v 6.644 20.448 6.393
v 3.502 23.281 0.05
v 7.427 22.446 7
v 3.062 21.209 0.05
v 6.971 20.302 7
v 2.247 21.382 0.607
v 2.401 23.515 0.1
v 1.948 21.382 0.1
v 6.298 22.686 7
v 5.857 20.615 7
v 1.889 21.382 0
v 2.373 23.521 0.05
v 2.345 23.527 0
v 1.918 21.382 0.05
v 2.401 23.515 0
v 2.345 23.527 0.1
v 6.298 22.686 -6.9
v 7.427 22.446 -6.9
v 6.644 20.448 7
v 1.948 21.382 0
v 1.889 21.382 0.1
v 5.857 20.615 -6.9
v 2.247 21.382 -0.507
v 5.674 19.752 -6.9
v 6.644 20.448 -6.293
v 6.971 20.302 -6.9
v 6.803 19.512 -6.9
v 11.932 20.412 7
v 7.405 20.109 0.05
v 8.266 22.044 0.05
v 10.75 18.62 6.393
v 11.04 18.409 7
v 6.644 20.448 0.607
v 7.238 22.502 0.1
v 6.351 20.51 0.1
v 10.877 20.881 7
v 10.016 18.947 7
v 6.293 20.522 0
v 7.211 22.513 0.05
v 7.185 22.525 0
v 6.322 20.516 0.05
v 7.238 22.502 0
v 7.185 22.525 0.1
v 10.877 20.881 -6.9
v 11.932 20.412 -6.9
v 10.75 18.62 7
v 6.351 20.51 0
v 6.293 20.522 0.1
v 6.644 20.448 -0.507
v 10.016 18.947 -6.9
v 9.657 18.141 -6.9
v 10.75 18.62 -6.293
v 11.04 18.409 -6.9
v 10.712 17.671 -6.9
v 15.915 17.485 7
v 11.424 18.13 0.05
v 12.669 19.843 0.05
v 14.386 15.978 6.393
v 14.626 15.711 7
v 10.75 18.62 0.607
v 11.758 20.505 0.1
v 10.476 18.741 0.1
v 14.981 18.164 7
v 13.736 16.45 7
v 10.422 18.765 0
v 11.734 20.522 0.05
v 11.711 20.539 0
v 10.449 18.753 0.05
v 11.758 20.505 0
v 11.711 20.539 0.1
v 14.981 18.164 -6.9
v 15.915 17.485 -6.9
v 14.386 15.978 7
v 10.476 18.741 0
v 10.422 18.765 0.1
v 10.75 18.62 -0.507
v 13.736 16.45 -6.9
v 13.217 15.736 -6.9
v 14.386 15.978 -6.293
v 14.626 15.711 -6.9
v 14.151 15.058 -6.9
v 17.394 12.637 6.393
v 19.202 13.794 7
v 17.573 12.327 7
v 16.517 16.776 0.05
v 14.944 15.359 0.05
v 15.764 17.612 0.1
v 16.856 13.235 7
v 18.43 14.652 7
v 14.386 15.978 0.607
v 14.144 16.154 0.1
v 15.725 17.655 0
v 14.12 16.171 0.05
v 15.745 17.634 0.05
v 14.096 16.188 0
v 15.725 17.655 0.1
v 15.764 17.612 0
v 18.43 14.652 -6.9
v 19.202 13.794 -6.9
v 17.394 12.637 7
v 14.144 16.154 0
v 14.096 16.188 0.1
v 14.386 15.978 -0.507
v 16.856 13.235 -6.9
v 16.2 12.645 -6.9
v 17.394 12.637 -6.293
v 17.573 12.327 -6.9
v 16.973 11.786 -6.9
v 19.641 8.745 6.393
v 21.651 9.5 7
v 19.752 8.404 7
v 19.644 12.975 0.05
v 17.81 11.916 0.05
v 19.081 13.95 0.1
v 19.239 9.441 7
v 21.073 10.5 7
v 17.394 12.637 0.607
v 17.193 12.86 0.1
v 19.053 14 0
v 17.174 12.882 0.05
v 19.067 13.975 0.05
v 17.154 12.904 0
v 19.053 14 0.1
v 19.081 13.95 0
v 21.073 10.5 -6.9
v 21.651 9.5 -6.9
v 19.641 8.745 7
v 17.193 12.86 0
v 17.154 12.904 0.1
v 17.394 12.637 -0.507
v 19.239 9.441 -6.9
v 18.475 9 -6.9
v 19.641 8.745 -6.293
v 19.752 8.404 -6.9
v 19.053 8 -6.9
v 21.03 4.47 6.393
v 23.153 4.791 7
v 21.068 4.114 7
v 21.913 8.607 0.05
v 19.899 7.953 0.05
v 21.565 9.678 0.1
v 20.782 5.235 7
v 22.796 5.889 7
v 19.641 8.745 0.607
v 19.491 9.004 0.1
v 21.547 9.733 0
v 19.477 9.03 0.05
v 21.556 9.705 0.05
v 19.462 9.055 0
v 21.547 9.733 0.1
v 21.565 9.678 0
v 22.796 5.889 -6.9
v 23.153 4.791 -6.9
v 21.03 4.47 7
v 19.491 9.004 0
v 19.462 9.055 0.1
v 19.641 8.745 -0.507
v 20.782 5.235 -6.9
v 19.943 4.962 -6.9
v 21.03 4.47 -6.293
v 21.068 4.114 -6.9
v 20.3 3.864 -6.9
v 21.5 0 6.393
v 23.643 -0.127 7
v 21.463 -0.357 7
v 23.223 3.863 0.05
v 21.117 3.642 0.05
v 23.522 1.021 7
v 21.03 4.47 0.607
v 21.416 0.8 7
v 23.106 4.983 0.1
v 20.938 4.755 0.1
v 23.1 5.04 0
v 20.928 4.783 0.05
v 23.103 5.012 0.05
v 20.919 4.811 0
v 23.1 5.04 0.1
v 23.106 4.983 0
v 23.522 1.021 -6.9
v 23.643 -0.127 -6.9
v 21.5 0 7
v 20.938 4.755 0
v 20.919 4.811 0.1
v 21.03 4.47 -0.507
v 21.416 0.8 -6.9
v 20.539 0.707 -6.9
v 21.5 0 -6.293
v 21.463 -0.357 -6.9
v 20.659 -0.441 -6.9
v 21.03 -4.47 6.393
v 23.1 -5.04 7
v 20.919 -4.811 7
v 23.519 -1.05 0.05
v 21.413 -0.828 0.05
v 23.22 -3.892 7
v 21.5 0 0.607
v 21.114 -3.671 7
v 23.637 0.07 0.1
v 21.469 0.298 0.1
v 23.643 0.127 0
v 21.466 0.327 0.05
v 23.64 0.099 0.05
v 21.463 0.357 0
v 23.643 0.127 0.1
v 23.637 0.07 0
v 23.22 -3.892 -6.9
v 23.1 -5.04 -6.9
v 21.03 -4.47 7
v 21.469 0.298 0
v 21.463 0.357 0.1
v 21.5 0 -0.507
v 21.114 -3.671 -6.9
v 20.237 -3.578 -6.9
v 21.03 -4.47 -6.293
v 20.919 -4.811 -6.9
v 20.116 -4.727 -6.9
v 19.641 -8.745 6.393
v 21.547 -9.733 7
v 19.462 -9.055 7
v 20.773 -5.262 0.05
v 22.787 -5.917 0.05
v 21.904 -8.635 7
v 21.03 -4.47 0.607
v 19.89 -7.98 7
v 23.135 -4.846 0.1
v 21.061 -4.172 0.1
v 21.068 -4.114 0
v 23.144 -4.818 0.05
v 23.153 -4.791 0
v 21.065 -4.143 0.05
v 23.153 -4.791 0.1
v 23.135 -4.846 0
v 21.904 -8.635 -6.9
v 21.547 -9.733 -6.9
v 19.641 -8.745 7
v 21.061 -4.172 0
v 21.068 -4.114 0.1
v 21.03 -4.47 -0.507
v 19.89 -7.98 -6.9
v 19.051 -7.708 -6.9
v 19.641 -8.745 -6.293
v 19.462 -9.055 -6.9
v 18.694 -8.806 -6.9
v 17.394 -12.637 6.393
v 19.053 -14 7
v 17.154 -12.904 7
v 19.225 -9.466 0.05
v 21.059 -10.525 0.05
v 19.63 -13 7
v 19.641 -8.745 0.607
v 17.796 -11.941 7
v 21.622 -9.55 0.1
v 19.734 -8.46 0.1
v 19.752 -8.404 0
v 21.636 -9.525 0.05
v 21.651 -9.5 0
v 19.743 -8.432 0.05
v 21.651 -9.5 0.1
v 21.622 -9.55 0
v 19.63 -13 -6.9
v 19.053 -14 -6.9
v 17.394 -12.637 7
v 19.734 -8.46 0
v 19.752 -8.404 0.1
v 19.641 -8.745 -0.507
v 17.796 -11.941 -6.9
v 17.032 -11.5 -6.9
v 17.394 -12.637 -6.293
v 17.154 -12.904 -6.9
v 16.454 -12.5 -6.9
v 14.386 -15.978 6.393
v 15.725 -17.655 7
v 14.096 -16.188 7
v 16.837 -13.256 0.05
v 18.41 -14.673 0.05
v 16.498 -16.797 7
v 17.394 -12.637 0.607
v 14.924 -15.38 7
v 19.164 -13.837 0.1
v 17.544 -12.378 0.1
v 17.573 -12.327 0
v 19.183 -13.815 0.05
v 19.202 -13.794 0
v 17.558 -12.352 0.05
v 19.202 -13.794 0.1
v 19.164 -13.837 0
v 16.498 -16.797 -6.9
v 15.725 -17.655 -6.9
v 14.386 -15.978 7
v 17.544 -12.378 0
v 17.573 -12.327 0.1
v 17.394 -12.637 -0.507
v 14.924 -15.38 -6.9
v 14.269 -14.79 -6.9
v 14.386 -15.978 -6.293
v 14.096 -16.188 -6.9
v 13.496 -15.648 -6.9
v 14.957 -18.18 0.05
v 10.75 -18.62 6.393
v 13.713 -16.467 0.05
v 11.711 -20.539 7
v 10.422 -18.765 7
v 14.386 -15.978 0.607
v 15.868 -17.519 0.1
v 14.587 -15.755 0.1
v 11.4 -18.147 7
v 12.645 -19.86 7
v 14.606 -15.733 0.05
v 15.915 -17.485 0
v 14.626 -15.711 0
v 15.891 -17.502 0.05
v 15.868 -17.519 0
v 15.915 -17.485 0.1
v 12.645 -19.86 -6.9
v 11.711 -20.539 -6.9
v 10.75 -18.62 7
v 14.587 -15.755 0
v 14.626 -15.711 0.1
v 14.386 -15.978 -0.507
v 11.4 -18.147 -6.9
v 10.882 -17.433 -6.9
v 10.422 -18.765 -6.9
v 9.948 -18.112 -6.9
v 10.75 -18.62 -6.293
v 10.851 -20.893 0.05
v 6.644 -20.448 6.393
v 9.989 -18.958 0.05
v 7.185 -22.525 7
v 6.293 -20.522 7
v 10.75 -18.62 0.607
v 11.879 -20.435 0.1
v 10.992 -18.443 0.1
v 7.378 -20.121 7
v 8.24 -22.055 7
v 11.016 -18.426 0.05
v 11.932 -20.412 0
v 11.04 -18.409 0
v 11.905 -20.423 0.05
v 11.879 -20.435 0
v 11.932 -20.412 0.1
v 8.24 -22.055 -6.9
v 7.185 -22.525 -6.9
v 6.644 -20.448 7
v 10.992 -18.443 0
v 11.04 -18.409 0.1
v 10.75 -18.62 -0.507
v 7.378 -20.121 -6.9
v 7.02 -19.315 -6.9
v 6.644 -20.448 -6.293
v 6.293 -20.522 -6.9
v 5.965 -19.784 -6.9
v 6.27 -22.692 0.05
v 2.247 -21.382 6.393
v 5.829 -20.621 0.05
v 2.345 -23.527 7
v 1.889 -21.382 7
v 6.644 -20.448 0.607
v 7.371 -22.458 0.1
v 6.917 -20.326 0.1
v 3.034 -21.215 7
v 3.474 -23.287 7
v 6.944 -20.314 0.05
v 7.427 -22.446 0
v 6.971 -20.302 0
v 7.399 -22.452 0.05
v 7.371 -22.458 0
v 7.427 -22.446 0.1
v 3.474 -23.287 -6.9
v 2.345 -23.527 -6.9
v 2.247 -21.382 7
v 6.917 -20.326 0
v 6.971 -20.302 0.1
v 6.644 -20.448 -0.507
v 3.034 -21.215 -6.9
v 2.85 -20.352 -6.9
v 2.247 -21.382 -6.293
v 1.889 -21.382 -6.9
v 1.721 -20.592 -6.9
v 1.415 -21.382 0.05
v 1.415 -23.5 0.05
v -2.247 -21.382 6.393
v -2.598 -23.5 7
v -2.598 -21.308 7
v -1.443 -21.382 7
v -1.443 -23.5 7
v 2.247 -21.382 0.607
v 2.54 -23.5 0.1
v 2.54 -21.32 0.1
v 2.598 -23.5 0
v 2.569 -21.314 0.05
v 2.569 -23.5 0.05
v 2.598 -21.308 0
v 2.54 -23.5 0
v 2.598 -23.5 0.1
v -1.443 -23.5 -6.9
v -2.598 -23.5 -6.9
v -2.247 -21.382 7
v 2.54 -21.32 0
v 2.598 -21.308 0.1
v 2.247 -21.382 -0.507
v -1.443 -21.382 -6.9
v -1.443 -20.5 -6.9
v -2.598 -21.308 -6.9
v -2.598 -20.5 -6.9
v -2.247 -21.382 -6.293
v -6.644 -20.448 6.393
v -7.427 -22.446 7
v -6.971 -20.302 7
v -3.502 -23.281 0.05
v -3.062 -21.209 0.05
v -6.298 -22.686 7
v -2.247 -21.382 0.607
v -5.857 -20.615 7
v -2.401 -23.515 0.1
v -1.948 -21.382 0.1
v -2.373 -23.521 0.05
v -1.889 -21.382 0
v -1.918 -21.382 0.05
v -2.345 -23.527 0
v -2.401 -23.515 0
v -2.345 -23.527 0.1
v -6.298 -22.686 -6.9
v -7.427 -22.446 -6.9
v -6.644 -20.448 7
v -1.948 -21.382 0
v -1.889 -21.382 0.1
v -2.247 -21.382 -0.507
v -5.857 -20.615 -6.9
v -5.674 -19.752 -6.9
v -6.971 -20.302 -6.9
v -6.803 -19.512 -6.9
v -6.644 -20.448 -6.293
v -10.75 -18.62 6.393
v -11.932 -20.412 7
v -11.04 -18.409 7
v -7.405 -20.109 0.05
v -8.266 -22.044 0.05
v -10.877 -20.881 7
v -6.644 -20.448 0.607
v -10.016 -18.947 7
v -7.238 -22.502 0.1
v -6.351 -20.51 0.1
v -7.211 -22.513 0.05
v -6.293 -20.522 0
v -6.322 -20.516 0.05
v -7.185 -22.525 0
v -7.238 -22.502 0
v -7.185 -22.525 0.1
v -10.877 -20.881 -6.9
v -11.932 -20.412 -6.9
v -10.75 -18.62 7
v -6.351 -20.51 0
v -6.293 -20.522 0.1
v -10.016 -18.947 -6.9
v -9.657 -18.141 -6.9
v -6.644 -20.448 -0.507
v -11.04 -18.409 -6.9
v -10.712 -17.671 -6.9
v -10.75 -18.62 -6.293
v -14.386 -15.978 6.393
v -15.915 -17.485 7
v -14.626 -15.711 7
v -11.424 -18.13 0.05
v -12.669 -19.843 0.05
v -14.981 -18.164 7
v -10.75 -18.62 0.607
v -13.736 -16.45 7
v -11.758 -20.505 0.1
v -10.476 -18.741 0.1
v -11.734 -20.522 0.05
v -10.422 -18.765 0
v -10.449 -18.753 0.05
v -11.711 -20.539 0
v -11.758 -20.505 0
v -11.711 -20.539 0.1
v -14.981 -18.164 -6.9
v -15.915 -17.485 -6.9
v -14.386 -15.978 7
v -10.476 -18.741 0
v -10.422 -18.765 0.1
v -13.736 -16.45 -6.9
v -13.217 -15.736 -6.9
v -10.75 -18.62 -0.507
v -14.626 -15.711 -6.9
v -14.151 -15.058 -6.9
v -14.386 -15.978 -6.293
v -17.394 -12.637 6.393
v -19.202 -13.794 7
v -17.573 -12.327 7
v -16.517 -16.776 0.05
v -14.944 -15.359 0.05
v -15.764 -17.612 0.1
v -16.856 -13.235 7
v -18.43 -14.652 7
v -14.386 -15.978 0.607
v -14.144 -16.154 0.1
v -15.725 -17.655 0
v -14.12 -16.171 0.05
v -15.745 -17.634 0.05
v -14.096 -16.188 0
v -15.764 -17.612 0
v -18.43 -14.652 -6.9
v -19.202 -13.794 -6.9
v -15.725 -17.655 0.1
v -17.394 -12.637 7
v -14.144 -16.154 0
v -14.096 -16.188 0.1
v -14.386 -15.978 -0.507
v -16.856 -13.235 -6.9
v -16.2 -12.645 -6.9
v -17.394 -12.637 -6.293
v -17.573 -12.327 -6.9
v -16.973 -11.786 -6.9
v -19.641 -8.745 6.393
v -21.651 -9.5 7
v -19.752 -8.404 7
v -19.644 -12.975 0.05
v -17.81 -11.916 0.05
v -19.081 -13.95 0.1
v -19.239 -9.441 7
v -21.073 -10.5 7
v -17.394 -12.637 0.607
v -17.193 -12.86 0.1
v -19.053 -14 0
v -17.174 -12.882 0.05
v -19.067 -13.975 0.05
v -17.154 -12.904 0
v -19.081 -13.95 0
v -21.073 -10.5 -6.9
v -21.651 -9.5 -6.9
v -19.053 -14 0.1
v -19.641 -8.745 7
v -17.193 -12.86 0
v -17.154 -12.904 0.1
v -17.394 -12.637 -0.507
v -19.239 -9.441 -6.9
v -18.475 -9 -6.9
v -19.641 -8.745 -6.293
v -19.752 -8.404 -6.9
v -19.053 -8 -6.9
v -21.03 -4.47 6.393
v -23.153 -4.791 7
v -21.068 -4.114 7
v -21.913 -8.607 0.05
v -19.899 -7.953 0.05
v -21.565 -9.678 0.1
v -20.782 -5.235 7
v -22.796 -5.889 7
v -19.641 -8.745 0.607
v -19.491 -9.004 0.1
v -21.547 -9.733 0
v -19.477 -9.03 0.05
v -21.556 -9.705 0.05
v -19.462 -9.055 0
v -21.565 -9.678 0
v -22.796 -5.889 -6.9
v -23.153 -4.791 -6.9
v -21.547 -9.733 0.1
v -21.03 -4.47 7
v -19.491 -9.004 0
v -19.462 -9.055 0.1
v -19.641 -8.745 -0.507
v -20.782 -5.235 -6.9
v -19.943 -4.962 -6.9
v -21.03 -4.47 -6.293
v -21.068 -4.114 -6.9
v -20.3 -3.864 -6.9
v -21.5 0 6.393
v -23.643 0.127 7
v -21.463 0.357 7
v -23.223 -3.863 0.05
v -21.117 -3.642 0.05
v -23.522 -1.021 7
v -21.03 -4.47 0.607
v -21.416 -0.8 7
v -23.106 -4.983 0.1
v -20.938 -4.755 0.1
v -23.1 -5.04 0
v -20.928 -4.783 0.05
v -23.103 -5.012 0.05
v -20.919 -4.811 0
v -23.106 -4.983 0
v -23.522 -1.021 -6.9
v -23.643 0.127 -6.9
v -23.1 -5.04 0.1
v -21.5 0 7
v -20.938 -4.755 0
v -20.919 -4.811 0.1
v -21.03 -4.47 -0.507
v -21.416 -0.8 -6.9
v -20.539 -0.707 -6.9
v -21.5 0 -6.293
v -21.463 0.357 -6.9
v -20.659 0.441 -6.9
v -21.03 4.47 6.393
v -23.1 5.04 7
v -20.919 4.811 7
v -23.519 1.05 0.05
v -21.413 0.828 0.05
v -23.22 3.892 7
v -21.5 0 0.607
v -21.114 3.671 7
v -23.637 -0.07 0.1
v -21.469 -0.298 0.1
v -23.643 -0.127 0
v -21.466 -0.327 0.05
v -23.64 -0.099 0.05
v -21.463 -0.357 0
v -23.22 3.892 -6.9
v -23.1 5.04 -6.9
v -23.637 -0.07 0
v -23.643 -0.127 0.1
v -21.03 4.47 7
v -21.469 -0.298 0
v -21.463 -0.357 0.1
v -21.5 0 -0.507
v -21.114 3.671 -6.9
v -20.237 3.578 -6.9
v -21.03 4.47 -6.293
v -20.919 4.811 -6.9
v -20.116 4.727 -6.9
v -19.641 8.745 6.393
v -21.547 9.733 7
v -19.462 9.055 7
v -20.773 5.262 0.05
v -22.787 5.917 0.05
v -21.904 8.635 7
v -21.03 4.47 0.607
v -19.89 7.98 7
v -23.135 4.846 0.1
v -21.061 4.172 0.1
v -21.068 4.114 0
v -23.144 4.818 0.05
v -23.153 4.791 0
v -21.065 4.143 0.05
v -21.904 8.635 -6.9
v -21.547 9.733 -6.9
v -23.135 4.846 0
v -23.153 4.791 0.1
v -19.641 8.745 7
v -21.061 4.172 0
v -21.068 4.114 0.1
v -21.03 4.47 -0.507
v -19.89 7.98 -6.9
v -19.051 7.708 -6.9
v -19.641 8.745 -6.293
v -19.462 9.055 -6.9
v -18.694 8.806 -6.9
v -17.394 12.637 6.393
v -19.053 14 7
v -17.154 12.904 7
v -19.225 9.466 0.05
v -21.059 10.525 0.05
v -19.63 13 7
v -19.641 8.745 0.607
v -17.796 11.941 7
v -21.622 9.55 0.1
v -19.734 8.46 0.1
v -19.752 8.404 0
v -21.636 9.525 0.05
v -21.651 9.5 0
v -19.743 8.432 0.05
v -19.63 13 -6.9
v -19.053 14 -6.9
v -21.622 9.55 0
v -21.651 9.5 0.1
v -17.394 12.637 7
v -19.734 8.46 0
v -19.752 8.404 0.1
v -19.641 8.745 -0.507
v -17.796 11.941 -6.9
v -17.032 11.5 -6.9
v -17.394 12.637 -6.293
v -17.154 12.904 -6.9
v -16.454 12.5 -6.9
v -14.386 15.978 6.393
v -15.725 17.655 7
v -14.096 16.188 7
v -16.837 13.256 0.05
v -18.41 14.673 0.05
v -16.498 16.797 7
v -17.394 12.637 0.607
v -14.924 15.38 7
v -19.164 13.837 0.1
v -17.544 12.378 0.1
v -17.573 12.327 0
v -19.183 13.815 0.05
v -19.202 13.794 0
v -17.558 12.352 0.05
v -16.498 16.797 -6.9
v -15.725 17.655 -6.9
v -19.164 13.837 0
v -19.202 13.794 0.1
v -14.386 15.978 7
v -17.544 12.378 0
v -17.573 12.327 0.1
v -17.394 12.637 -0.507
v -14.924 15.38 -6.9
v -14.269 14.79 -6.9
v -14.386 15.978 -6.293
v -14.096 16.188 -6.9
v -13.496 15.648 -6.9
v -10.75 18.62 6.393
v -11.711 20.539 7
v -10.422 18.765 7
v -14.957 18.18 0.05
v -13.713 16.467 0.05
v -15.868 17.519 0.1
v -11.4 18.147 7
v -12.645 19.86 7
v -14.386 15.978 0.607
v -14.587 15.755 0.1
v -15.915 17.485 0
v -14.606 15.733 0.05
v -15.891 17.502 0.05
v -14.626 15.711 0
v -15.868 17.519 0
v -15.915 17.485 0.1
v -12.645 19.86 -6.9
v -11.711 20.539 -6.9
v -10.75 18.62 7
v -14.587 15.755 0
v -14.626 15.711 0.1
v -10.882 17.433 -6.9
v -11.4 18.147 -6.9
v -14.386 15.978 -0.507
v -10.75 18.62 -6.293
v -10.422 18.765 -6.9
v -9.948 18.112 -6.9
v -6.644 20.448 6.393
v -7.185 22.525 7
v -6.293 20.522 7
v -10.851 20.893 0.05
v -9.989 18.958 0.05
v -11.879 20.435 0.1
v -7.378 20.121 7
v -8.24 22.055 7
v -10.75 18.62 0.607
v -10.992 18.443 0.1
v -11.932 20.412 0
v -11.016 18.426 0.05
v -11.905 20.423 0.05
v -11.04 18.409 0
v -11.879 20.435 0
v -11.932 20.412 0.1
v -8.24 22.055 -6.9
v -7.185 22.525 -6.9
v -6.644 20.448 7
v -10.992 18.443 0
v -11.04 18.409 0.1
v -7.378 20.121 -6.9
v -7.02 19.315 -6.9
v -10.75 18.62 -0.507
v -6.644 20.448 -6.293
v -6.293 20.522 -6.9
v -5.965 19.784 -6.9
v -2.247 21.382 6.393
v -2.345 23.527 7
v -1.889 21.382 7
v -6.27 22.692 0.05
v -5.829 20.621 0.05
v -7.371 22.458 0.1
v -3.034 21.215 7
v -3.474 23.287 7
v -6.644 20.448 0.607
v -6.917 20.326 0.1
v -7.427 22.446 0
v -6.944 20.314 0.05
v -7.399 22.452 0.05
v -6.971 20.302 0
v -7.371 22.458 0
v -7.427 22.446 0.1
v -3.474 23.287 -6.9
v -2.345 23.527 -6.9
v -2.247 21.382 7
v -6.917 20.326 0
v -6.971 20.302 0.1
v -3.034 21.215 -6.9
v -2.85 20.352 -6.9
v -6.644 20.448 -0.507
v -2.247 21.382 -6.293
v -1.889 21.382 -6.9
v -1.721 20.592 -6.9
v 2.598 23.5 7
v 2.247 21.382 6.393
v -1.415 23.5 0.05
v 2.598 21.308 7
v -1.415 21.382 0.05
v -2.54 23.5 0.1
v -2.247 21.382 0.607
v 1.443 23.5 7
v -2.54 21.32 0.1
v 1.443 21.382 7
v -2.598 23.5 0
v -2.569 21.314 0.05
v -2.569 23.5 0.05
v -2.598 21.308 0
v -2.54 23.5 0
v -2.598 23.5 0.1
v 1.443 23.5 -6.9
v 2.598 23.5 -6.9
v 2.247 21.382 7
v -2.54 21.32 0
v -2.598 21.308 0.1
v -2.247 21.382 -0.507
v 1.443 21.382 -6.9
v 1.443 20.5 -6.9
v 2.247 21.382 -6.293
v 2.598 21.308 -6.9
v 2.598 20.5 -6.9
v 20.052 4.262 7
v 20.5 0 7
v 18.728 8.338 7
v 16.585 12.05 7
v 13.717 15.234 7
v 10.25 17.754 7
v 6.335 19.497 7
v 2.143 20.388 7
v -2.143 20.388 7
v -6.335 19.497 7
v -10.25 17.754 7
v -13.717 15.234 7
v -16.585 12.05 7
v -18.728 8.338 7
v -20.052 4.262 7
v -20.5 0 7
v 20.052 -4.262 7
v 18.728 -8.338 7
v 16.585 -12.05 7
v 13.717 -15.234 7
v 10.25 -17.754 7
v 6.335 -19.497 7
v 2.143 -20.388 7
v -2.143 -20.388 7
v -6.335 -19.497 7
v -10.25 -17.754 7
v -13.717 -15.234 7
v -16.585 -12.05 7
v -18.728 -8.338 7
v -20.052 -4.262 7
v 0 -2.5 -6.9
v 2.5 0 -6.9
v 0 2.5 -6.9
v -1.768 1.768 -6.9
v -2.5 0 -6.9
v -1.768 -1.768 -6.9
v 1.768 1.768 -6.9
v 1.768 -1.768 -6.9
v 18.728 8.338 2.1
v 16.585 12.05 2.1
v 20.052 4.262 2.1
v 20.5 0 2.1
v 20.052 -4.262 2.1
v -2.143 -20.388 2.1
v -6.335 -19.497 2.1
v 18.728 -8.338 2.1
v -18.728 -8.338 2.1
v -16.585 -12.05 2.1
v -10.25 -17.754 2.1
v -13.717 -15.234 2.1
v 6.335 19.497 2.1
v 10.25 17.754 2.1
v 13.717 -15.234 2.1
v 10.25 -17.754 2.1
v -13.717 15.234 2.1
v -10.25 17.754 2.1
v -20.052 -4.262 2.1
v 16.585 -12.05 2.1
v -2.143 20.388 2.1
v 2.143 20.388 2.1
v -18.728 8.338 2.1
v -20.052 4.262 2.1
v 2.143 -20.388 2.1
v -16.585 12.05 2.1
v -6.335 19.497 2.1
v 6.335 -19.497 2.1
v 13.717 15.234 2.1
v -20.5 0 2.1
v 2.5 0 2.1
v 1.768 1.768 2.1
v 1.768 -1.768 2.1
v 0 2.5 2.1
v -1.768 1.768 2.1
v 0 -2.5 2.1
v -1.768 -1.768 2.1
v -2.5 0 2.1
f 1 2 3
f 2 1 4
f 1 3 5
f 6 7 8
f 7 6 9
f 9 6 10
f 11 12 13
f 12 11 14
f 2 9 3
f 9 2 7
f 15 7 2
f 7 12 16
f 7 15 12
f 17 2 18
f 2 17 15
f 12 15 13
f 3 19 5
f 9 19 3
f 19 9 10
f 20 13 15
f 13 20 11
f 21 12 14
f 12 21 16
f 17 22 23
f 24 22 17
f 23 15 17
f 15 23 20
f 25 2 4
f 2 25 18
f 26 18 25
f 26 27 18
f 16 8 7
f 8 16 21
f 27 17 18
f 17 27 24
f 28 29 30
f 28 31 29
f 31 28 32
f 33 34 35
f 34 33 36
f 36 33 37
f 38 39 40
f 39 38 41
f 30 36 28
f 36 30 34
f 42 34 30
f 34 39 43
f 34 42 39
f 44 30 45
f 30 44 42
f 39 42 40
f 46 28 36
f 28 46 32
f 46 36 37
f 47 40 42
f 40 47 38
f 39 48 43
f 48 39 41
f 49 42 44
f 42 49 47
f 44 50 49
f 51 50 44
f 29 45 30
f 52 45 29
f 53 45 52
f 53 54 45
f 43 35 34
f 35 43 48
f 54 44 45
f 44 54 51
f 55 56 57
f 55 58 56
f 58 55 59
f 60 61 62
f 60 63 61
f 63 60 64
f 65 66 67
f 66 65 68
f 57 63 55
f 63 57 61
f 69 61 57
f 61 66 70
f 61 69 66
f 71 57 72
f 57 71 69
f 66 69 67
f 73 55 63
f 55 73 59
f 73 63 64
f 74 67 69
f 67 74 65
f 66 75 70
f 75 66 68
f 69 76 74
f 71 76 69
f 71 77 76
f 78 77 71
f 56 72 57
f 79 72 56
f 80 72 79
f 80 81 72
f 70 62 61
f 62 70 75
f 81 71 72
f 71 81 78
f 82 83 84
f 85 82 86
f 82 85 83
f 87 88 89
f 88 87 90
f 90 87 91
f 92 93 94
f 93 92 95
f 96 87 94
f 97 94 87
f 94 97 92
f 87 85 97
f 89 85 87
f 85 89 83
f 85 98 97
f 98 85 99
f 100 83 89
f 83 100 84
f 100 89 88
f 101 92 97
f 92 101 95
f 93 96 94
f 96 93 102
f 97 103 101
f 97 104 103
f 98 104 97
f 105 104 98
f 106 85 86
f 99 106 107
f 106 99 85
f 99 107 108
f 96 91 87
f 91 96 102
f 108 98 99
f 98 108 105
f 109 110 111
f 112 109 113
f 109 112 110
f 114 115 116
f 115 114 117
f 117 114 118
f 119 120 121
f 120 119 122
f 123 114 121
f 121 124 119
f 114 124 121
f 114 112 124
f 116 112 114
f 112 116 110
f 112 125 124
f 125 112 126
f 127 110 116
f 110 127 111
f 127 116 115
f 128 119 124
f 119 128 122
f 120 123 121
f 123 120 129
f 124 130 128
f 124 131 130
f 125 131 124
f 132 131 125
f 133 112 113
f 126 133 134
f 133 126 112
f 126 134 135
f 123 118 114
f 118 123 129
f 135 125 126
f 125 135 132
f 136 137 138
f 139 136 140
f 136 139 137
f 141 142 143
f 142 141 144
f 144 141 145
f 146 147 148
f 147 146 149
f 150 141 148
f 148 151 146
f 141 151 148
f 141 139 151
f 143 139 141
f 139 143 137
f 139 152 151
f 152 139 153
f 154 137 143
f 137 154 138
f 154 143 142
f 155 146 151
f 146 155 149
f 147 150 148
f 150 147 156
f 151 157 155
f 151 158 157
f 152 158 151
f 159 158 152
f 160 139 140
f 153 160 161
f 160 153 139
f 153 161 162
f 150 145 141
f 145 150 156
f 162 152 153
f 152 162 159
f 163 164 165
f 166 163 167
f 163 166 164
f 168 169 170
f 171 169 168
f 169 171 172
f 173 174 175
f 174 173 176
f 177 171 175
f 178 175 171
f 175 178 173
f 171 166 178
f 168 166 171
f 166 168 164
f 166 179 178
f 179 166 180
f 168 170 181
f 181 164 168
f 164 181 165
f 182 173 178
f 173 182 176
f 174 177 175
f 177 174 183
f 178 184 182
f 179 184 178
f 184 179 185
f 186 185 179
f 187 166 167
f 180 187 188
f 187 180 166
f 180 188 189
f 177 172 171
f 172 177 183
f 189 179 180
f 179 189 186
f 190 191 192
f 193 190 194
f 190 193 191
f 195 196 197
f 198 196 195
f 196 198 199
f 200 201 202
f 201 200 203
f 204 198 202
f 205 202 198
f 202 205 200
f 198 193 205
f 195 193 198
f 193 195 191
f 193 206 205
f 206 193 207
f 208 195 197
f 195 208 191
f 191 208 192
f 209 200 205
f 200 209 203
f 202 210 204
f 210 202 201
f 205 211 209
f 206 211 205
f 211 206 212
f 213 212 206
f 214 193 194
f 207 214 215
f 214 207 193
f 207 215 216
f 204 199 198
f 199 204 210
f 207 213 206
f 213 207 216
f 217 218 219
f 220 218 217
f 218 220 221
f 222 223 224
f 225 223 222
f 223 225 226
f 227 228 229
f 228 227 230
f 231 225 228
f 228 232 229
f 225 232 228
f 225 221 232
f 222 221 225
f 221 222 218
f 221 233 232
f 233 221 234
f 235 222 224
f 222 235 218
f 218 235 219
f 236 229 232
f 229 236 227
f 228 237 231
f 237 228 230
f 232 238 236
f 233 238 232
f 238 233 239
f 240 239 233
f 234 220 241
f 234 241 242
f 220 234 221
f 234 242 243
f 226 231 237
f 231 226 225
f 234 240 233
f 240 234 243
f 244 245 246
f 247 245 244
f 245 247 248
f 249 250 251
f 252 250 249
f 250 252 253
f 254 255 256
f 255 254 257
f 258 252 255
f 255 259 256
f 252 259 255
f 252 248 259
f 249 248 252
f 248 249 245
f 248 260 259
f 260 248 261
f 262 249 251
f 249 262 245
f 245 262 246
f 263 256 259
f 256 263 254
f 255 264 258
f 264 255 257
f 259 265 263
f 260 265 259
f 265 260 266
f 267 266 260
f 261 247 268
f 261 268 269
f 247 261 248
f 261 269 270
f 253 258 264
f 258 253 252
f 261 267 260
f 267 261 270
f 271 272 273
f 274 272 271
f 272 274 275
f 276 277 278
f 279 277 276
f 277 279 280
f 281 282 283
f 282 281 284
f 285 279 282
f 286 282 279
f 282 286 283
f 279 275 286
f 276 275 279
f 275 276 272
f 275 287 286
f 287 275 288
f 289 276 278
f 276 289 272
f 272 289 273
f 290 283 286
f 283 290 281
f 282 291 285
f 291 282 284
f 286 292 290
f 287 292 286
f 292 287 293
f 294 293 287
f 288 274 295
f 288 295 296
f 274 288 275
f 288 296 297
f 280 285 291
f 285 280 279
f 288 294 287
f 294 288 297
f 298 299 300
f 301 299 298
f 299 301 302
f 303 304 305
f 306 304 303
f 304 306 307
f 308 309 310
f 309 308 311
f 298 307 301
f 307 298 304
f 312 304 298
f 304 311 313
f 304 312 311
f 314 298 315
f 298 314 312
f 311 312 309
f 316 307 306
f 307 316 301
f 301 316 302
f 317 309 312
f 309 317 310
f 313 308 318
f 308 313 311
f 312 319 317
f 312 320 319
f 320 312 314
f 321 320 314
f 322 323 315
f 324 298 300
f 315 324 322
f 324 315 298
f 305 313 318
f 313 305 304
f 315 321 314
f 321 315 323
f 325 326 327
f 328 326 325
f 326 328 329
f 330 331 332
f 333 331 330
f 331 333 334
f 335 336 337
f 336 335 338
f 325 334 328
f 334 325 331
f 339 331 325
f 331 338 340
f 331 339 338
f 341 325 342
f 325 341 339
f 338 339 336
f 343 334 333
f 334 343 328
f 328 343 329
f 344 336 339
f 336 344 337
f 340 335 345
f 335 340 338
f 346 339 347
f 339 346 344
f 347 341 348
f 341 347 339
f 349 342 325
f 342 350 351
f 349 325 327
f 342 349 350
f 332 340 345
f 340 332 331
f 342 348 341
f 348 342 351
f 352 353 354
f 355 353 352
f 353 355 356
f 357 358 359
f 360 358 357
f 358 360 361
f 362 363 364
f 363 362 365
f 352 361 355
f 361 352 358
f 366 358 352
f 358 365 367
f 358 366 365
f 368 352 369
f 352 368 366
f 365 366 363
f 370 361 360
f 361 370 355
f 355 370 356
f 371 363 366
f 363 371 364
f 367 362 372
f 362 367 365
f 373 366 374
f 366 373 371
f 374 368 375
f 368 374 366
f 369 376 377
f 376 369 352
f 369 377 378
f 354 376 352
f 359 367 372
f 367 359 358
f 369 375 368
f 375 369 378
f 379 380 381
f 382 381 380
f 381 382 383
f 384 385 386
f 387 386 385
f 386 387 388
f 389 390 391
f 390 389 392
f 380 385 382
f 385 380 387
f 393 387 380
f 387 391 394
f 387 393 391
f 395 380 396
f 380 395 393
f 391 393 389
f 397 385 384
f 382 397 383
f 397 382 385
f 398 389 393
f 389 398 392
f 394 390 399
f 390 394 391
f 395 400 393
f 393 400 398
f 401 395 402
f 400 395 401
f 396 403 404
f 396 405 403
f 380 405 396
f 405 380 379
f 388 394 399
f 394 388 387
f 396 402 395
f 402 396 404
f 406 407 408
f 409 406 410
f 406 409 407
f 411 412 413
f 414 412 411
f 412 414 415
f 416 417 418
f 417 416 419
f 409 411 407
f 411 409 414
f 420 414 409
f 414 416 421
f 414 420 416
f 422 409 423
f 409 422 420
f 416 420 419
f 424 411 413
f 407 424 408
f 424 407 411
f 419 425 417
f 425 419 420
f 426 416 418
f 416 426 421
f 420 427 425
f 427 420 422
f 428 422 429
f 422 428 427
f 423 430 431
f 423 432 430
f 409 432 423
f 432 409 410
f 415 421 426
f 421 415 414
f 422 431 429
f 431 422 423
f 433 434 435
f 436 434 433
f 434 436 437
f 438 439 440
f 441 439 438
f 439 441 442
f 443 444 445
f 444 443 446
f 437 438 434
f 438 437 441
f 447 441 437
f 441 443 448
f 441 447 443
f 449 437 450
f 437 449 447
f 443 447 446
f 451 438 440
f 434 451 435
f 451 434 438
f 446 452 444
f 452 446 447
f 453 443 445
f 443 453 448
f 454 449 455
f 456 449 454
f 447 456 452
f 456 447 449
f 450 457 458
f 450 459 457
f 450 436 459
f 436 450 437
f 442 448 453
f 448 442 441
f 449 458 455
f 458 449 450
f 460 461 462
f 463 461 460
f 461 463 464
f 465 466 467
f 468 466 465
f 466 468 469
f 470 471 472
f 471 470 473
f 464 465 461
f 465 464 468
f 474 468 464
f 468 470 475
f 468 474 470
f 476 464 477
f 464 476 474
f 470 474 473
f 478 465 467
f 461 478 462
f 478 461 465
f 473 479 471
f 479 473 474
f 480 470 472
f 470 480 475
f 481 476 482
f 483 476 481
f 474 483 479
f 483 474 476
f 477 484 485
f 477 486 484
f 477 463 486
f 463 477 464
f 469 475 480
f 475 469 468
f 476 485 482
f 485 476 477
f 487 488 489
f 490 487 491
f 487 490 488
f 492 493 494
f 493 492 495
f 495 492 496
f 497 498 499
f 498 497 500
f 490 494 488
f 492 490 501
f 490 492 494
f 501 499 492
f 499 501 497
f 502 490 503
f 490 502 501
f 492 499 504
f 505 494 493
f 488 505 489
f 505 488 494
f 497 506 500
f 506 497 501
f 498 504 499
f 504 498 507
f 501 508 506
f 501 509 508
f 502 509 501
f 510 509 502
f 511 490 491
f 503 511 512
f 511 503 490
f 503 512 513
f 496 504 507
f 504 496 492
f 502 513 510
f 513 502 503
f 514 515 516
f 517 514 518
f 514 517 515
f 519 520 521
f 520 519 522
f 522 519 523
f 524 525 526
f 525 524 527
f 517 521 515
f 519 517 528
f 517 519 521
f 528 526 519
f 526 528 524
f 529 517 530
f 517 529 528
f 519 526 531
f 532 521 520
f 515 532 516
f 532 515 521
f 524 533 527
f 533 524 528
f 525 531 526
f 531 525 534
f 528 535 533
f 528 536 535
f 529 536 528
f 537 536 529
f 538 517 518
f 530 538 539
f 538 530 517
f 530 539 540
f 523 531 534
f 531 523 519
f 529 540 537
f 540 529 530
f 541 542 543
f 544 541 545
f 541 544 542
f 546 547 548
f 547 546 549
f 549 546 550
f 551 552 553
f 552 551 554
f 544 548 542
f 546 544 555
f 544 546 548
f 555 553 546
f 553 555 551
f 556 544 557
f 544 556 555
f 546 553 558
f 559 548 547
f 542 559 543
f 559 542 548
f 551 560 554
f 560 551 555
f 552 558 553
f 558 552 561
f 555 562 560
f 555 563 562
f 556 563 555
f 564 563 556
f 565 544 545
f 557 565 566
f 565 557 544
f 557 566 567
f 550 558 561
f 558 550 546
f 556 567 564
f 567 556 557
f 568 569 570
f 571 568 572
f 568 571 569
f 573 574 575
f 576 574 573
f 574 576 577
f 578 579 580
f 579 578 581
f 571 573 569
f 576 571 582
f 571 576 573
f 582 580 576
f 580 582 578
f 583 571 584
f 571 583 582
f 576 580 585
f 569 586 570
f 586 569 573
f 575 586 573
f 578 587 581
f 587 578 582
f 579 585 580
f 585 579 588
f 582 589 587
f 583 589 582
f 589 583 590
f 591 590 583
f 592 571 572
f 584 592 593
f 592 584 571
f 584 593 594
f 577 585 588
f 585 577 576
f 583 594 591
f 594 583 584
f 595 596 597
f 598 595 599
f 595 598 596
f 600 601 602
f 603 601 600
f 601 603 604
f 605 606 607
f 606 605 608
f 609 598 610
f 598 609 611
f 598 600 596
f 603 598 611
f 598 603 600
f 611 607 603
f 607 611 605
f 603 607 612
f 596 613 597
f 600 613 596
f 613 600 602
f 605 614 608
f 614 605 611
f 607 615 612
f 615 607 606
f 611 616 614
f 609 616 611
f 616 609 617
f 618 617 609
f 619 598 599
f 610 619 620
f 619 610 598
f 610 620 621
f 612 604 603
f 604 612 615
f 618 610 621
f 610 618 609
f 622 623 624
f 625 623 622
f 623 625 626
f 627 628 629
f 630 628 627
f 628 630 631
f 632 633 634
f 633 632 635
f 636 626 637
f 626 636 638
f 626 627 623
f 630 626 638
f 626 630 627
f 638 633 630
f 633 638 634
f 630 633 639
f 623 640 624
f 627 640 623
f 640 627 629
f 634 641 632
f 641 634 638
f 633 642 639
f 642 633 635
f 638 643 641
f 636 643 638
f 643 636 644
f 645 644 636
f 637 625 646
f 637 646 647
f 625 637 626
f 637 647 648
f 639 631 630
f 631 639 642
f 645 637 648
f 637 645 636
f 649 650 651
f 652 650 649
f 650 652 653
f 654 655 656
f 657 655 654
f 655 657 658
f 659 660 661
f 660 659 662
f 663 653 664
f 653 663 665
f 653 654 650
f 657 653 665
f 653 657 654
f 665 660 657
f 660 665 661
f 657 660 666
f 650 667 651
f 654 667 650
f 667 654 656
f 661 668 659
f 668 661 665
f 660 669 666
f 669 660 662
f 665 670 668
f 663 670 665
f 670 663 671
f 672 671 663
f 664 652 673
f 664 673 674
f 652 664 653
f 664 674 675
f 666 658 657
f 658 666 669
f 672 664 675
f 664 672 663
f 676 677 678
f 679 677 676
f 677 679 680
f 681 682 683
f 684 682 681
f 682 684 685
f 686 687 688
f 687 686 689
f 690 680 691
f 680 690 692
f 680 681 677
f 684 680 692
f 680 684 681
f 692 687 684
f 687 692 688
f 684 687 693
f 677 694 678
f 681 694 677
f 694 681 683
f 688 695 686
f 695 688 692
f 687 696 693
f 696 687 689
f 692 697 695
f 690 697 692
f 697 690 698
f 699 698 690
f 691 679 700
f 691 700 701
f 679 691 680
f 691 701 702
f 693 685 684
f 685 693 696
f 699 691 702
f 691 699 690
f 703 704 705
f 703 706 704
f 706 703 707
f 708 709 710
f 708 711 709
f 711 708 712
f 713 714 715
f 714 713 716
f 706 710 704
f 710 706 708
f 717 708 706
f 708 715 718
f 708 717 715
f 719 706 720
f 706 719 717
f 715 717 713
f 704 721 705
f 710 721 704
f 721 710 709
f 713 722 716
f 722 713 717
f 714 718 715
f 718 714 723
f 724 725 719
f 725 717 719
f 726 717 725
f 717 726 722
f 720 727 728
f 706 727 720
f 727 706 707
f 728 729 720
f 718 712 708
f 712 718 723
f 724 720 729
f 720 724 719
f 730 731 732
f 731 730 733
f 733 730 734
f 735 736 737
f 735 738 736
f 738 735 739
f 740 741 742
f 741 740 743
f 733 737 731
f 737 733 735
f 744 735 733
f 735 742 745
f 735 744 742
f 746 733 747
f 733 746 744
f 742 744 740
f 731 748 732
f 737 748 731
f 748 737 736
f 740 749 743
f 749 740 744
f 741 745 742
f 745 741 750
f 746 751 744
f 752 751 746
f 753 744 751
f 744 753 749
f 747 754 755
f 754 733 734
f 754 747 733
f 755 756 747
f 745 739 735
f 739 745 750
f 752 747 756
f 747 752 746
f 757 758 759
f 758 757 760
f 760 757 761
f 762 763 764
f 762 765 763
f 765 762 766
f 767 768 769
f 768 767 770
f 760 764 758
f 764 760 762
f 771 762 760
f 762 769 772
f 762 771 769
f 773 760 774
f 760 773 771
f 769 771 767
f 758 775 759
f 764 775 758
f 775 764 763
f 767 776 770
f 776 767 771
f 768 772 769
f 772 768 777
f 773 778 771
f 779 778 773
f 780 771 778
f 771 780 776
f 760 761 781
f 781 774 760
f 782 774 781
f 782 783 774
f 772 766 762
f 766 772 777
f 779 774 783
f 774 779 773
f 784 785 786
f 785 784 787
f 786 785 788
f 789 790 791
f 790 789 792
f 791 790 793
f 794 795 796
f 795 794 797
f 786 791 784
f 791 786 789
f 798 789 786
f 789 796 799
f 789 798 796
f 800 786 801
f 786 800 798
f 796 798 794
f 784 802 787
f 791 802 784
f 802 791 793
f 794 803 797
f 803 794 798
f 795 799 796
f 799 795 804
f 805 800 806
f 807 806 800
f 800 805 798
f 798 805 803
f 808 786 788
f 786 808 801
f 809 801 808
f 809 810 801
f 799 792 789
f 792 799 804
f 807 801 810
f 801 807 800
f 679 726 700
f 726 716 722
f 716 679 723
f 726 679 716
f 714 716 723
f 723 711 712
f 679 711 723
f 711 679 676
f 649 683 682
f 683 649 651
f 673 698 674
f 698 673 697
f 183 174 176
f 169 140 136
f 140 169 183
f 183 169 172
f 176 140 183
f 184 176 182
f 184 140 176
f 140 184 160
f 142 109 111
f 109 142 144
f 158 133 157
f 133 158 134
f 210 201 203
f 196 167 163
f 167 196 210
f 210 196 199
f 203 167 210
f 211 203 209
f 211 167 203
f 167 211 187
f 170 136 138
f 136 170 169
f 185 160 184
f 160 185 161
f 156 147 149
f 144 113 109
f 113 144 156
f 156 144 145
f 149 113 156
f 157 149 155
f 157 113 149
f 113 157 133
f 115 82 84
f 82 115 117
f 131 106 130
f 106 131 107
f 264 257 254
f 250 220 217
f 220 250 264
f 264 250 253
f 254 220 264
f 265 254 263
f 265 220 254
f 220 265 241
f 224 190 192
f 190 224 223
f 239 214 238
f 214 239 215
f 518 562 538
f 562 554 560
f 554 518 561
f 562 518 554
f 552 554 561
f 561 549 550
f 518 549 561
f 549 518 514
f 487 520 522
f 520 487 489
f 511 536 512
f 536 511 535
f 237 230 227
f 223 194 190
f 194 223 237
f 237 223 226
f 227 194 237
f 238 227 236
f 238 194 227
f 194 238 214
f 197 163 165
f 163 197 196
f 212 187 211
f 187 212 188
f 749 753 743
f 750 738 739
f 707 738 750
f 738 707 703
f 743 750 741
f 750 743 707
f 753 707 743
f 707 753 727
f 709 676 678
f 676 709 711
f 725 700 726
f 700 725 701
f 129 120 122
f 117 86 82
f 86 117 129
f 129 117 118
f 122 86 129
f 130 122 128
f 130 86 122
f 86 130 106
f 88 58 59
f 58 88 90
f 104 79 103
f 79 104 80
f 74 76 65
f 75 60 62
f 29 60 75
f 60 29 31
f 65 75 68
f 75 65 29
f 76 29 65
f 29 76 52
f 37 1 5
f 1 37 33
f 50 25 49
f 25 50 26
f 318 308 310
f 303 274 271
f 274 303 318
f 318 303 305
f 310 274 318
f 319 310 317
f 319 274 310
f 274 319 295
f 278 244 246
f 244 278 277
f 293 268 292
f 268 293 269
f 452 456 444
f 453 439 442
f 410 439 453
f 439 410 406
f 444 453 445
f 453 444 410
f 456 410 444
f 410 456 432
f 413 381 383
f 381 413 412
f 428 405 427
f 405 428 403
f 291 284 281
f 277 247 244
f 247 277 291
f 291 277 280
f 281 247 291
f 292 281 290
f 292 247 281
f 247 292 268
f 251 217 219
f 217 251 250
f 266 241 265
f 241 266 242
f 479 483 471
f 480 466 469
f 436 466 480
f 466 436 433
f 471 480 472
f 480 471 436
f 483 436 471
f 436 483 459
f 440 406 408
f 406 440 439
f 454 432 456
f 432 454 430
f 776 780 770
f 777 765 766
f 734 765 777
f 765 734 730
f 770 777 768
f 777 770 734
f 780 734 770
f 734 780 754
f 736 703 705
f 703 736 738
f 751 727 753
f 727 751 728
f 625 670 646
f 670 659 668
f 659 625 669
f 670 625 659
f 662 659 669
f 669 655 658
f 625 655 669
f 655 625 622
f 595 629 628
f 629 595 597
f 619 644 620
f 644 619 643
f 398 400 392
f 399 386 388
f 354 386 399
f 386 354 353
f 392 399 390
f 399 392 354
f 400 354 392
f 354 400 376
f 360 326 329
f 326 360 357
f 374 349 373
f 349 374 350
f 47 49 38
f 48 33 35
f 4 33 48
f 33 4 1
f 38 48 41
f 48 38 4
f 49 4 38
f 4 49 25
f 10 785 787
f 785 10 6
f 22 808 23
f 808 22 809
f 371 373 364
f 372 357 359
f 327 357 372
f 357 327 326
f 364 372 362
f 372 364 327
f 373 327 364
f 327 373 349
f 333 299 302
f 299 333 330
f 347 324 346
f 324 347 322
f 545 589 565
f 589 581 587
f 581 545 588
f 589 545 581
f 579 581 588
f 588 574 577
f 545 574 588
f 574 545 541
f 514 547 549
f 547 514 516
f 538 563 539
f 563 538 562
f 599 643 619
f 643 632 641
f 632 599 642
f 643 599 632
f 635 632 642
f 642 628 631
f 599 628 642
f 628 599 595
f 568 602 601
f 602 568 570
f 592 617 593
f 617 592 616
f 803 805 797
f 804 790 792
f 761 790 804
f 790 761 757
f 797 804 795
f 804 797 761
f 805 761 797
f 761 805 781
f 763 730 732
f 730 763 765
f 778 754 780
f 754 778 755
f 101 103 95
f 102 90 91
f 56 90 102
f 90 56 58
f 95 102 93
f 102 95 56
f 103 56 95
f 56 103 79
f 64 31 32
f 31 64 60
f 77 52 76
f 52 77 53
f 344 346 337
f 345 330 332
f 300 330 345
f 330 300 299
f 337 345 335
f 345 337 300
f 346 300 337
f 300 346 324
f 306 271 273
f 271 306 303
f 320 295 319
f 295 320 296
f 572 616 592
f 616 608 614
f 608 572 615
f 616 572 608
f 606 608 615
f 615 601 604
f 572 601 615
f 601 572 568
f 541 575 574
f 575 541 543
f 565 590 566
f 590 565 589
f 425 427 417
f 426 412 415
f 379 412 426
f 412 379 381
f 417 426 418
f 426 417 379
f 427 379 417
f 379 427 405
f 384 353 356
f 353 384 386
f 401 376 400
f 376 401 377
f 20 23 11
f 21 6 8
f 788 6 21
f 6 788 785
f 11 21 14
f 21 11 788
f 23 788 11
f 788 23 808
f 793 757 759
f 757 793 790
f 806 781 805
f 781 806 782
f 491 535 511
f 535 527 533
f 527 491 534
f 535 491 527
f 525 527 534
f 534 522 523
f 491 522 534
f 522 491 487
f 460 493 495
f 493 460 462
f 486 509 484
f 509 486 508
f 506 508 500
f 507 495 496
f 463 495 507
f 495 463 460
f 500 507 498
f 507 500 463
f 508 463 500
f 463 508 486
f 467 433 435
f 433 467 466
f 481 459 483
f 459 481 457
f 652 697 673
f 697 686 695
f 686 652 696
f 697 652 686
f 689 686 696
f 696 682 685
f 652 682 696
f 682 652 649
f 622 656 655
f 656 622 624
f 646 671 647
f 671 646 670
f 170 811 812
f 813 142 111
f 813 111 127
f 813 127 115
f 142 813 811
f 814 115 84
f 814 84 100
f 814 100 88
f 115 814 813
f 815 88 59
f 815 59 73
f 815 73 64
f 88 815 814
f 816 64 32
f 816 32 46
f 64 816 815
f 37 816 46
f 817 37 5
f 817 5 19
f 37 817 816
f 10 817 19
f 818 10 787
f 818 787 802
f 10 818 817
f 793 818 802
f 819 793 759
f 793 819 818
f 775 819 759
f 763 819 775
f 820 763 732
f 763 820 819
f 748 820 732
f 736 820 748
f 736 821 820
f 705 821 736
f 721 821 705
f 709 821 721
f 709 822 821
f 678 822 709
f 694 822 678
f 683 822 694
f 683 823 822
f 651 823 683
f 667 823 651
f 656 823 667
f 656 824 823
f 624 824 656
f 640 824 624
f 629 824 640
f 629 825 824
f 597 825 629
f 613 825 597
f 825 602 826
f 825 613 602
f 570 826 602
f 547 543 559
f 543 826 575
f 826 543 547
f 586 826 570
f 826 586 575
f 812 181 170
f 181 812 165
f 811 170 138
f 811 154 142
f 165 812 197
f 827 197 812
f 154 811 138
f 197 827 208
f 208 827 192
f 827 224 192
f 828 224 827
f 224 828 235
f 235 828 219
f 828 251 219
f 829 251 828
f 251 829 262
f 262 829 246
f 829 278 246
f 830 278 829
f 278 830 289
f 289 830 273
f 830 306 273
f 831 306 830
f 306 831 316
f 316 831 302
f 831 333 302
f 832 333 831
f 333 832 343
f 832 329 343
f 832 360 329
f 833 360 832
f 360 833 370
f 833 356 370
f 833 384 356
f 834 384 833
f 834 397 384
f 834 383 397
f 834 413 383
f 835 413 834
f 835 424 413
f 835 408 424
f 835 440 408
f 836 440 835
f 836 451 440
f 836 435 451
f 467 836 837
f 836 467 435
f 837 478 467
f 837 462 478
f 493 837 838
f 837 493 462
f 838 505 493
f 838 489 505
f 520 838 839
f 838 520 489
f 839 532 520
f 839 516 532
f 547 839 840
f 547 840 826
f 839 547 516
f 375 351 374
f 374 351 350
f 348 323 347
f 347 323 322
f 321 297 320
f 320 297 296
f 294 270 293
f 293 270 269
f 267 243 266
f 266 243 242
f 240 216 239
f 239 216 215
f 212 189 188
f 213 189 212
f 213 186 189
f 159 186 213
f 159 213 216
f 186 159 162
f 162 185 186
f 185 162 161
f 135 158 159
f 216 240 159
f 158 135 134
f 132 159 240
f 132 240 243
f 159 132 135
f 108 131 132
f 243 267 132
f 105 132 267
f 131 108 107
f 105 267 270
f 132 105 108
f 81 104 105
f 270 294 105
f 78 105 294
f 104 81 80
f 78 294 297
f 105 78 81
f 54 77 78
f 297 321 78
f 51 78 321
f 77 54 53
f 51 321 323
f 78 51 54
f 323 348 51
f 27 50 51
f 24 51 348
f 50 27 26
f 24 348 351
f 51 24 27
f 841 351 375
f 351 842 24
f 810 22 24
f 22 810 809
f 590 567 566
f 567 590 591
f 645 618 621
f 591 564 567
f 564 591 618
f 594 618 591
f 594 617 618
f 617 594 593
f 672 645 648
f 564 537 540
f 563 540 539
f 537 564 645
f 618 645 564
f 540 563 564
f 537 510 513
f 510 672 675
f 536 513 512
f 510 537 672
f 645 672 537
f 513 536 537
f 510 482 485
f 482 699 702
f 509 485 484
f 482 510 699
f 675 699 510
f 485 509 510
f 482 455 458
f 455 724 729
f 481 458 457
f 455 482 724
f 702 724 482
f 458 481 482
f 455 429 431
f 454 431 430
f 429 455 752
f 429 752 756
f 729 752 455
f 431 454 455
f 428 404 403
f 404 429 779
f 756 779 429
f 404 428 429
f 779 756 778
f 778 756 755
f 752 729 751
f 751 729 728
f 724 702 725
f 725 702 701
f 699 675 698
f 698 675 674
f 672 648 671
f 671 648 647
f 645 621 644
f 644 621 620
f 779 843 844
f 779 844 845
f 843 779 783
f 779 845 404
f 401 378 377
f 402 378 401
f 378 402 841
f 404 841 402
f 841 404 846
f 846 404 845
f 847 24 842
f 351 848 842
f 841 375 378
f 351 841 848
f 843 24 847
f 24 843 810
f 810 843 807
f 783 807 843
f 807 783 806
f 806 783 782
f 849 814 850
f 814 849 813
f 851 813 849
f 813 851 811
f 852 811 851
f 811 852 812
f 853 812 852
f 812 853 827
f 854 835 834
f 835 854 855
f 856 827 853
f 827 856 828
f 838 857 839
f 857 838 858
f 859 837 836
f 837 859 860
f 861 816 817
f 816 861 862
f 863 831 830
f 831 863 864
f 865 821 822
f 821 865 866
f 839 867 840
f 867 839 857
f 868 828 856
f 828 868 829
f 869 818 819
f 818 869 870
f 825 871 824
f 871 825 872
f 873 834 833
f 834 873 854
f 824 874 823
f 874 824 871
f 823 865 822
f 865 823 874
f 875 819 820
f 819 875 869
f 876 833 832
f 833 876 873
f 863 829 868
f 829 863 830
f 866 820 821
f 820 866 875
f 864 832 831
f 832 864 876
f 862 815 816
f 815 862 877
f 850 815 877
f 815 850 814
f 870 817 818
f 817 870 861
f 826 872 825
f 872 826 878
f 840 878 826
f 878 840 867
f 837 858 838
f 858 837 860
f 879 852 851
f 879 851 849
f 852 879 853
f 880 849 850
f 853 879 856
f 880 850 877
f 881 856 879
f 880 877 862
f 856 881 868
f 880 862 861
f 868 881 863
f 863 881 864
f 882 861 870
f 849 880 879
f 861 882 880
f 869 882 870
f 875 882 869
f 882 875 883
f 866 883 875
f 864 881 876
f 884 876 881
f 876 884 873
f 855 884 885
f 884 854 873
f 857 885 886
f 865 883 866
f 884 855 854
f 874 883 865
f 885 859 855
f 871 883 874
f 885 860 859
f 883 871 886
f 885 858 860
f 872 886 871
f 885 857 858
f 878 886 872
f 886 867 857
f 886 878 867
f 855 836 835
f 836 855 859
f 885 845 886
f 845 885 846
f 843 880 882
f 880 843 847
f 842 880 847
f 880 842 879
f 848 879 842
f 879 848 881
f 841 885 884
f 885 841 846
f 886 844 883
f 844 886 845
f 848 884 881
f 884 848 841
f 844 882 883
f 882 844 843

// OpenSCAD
// Helical Gears
// Catarina Mota
// catarinamfmota@gmail.com
// Creative Commons Attribution Share Alike
// 20091123


//GEAR PARAMETERS
doubleHelical=1; //int: 0=no, 1=yes (will make the gear 2x taller)

gearHeight=7; //gear depth

pitchDiam=45; //pitch diameter

shaftDiam=5; //shaft diameter

//TEETH PARAMETERS
teethNum=30; //number of teeth (int)

addendum=1;

dedendum=1;

toothWidth=1;

angle=30; //positive=right, negative=left

//CENTER SHAPE PARAMETERS
centerShape=1; //int: solid=1, star=2, circle=3

starNum=6; //number of lines for star shape (int)
starWidth=2; //width of star lines

circleNum=7; //number of circles (int)
circleDiam=7; //diameter of circles

//CENTER CIRCLE PARAMETERS
extrudeOut=0; //int: 0=no, 1=yes
extrudeOutHeight=3;
extrudeOutWidth=7; //in relationship to shaft

extrudeIn=1; //int: 0=no, 1=yes
//extrudeInDiam=pitchDiam/2-dedendum*2;
extrudeInRad=pitchDiam/2-dedendum*2;
extrudeInHeight=5;

//ROME (extrudeIn must be set to 0)
rome=0; //int: 0=no, 1=yes
romeDiam=pitchDiam/2; //pitch diameter for top gear
romeHeight=gearHeight; //top gear height
romeTeeth=teethNum*2/3;
romeAdd=2; //top gear addendum
romeDed=2; //top gear dedendum
romeToothWidth=2; //teeth width for top gear
romeAngle=5; //rotate top gear (angle)

//----------------------

gear();

//----------------------

//TOOTH
module tooth(heightGear, diamPitch) {

	toothHeight=addendum+dedendum*2;

	union(){
		translate([0,toothHeight/2,0]) rotateTooth(1);
		if (doubleHelical==1){
			translate([0,toothHeight/2,-heightGear+0.1]) rotateTooth(-1);
		}
	}

	module rotateTooth(direction){
		difference(){
			rotate([0,direction*angle,0])
			box(toothWidth,toothHeight,heightGear*1.5);

			translate([0,0,heightGear*0.75+dedendum/2])
			box(heightGear,toothHeight+0.5,dedendum+heightGear/2);

			translate([0,0,-heightGear*0.75-dedendum/2])
			box(heightGear,toothHeight+0.5,dedendum+heightGear/2);
		}
	}
}



//HELICAL
module helical(numTeeth, diamPitch, heightGear) {
	rootRad=diamPitch/2-dedendum;
	difference(){
	for (i = [1:numTeeth]) {
		translate([sin(360*i/numTeeth)*(rootRad-dedendum), cos(360*i/numTeeth)*(rootRad-dedendum), 0 ]){
			rotate([0,0,-360*i/numTeeth]) tooth(heightGear, diamPitch);
		}
	}
	translate([0,0,-gearHeight/2-1]) cylinder(heightGear+2, diamPitch/2-dedendum, diamPitch/2-dedendum);
	}
}

//SOLID
module solid(heightGear, diamPitch) {
	rootRad=diamPitch/2-dedendum;
	translate([0,0,-(heightGear*doubleHelical)+0.1*doubleHelical])
	cylinder(heightGear+(heightGear-0.1)*doubleHelical, rootRad, rootRad);
}

//STAR
module star() {
	starAngle=360/starNum;
	rootRad=diamPitch/2-dedendum;
	union(){
		for (s=[1:starNum]){
			translate([0,0,gearHeight/2-(gearHeight/2*doubleHelical)]){
				rotate([0, 0, s*starAngle]) dislocateBox(starWidth, (pitchDiam/2-dedendum*2)/2, gearHeight+(gearHeight*doubleHelical));
			}
		}
		translate ([0,0,-gearHeight*doubleHelical])
		tube(gearHeight+(gearHeight*doubleHelical), pitchDiam/2-dedendum, starWidth);
		translate ([0,0,-gearHeight*doubleHelical]){
			tube(gearHeight+(gearHeight*doubleHelical), pitchDiam/4+dedendum, starWidth);
			//cylinder(gearHeight+(gearHeight*doubleHelical), pitchDiam/4+dedendum, pitchDiam/4+dedendum);
		}
		translate([0,0,-gearHeight*doubleHelical])
		cylinder(gearHeight+(gearHeight*doubleHelical), shaftDiam/2+starWidth, shaftDiam/2+starWidth);
	}
}

//CIRCLE
module circle() {
	rootRad=pitchDiam/2-dedendum;
	difference(){
		solid(gearHeight-0.1*doubleHelical, pitchDiam);
		for (c=[1:circleNum]){
			translate([sin(360*c/circleNum)*(rootRad/2+shaftDiam/2), cos(360*c/circleNum)*(rootRad/2+shaftDiam/2), -gearHeight*doubleHelical]){
				cylinder(gearHeight+gearHeight*doubleHelical, circleDiam/2, circleDiam/2);
			}
		}
	}
}

//ROME
module romeGear(){
	translate([0,0,romeHeight/2+gearHeight]){
		rotate([0,0,romeAngle]){
			union(){
				helical(romeTeeth, romeDiam, romeHeight);
				translate ([0,0,-romeHeight/2]) solid(romeHeight, romeDiam);
			}
		}
	}
}

//GEAR
module gear(){

	difference () {

		union() {
			translate([0,0,gearHeight/2]) helical(teethNum, pitchDiam, gearHeight);

			if (centerShape==1)  solid(gearHeight, pitchDiam);

			if (centerShape==2) star();

			if (centerShape==3) circle();

			if (rome==1) romeGear();

			//extrudeOut around shaft
			if (extrudeOut==1) {
translate([0,0,-gearHeight*doubleHelical+0.1*doubleHelical])	cylinder(gearHeight-(extrudeInHeight*extrudeIn)+extrudeOutHeight+romeHeight*rome+gearHeight*doubleHelical-0.1*doubleHelical, extrudeOutWidth/2+shaftDiam/2, extrudeOutWidth/2+shaftDiam/2);
			}

		}

	//extrudeIn around shaft
		if (extrudeIn==1) {
			difference(){
				translate([0,0,gearHeight-extrudeInHeight+0.1*doubleHelical]) cylinder(extrudeInHeight, extrudeInRad, extrudeInRad);
				cylinder(gearHeight+extrudeOutHeight, (extrudeOutWidth+shaftDiam)/2*extrudeOut, (extrudeOutWidth+shaftDiam)/2*extrudeOut);
			}
		}

	//shaft
	translate([0,0,-gearHeight*doubleHelical]) cylinder(gearHeight+extrudeOutHeight+romeHeight+(gearHeight*doubleHelical), shaftDiam/2, shaftDiam/2);
	}
}

//----------------------

//SILLY WAY TO GET AROUND ROTATION AXIS

module dislocateBox(xBox, yBox, zBox){
	translate([0,yBox,0]){
		difference(){
			box(xBox, yBox*2, zBox);
			translate([-xBox,0,0]) box(xBox, yBox*2, zBox);
		}
	}
}

//----------------------

module box(w,h,d) {
	scale ([w,h,d]) cube(1, true);
}

module hollowBox(w,h,d,wall){
	difference(){
		box(w,h,d);
		box(w-wall*2,h-wall*2,d);
	}
}

module roundedBox(w,h,d,f){
	difference(){
		box(w,h,d);
		translate([-w/2,h/2,0]) cube(w/(f/2),true);
		translate([w/2,h/2,0]) cube(w/(f/2),true);
		translate([-w/2,-h/2,0]) cube(w/(f/2),true);
		translate([w/2,-h/2,0]) cube(w/(f/2),true);
	}
	translate([-w/2+w/f,h/2-w/f,-d/2]) cylinder(d,w/f, w/f);
	translate([w/2-w/f,h/2-w/f,-d/2]) cylinder(d,w/f, w/f);
	translate([-w/2+w/f,-h/2+w/f,-d/2]) cylinder(d,w/f, w/f);
	translate([w/2-w/f,-h/2+w/f,-d/2]) cylinder(d,w/f, w/f);
}

module cone(height, radius) {
		cylinder(height, radius, 0);
}

module oval(w,h,d) {
	scale ([w/100, h/100, 1]) cylinder(d, 50, 50);
}

module tube(height, radius, wall) {
	difference(){
		cylinder(height, radius, radius);
		cylinder(height, radius-wall, radius-wall);
	}
}

module ovalTube(w,h,d,wall) {
	difference(){
		scale ([w/100, h/100, 1]) cylinder(d, 50, 50);
		scale ([w/100, h/100, 1]) cylinder(d, 50-wall, 50-wall);
	}
}


module tearDrop(diam) {
	f=0.52;
	union(){
		translate([0,diam*0.70,depth/2]) rotate([0,0,135]) rightTriangle(diam*f,diam*f, depth);
		cylinder(depth,diam/2,diam/2);
	}
}

module hexagon(height, depth) {
	boxWidth=height/1.75;
		union(){
			box(boxWidth, height, depth);
			rotate([0,0,60]) box(boxWidth, height, depth);
			rotate([0,0,-60]) box(boxWidth, height, depth);
		}
}

module octagon(height, depth) {
	intersection(){
		box(height, height, depth);
		rotate([0,0,45]) box(height, height, depth);
	}
}

module dodecagon(height, depth) {
	intersection(){
		hexagon(height, depth);
		rotate([0,0,90]) hexagon(height, depth);
	}
}

module hexagram(height, depth) {
	boxWidth=height/1.75;
	intersection(){
		box(height, boxWidth, depth);
		rotate([0,0,60]) box(height, boxWidth, depth);
	}
	intersection(){
		box(height, boxWidth, depth);
		rotate([0,0,-60]) box(height, boxWidth, depth);
	}
	intersection(){
		rotate([0,0,60]) box(height, boxWidth, depth);
		rotate([0,0,-60]) box(height, boxWidth, depth);
	}
}

module rightTriangle(adjacent, opposite, depth) {
	difference(){
		translate([-adjacent/2,opposite/2,0]) box(adjacent, opposite, depth);
		translate([-adjacent,0,0]){
			rotate([0,0,atan(opposite/adjacent)]) dislocateBox(adjacent*2, opposite, depth);
		}
	}
}

module equiTriangle(side, depth) {
	difference(){
		translate([-side/2,side/2,0]) box(side, side, depth);
		rotate([0,0,30]) dislocateBox(side*2, side, depth);
		translate([-side,0,0]){
			rotate([0,0,60]) dislocateBox(side*2, side, depth);
		}
	}
}

module 12ptStar(height, depth) {
	starNum=3;
	starAngle=360/starNum;
	for (s=[1:starNum]){
		rotate([0, 0, s*starAngle]) box(height, height, depth);
	}
}
